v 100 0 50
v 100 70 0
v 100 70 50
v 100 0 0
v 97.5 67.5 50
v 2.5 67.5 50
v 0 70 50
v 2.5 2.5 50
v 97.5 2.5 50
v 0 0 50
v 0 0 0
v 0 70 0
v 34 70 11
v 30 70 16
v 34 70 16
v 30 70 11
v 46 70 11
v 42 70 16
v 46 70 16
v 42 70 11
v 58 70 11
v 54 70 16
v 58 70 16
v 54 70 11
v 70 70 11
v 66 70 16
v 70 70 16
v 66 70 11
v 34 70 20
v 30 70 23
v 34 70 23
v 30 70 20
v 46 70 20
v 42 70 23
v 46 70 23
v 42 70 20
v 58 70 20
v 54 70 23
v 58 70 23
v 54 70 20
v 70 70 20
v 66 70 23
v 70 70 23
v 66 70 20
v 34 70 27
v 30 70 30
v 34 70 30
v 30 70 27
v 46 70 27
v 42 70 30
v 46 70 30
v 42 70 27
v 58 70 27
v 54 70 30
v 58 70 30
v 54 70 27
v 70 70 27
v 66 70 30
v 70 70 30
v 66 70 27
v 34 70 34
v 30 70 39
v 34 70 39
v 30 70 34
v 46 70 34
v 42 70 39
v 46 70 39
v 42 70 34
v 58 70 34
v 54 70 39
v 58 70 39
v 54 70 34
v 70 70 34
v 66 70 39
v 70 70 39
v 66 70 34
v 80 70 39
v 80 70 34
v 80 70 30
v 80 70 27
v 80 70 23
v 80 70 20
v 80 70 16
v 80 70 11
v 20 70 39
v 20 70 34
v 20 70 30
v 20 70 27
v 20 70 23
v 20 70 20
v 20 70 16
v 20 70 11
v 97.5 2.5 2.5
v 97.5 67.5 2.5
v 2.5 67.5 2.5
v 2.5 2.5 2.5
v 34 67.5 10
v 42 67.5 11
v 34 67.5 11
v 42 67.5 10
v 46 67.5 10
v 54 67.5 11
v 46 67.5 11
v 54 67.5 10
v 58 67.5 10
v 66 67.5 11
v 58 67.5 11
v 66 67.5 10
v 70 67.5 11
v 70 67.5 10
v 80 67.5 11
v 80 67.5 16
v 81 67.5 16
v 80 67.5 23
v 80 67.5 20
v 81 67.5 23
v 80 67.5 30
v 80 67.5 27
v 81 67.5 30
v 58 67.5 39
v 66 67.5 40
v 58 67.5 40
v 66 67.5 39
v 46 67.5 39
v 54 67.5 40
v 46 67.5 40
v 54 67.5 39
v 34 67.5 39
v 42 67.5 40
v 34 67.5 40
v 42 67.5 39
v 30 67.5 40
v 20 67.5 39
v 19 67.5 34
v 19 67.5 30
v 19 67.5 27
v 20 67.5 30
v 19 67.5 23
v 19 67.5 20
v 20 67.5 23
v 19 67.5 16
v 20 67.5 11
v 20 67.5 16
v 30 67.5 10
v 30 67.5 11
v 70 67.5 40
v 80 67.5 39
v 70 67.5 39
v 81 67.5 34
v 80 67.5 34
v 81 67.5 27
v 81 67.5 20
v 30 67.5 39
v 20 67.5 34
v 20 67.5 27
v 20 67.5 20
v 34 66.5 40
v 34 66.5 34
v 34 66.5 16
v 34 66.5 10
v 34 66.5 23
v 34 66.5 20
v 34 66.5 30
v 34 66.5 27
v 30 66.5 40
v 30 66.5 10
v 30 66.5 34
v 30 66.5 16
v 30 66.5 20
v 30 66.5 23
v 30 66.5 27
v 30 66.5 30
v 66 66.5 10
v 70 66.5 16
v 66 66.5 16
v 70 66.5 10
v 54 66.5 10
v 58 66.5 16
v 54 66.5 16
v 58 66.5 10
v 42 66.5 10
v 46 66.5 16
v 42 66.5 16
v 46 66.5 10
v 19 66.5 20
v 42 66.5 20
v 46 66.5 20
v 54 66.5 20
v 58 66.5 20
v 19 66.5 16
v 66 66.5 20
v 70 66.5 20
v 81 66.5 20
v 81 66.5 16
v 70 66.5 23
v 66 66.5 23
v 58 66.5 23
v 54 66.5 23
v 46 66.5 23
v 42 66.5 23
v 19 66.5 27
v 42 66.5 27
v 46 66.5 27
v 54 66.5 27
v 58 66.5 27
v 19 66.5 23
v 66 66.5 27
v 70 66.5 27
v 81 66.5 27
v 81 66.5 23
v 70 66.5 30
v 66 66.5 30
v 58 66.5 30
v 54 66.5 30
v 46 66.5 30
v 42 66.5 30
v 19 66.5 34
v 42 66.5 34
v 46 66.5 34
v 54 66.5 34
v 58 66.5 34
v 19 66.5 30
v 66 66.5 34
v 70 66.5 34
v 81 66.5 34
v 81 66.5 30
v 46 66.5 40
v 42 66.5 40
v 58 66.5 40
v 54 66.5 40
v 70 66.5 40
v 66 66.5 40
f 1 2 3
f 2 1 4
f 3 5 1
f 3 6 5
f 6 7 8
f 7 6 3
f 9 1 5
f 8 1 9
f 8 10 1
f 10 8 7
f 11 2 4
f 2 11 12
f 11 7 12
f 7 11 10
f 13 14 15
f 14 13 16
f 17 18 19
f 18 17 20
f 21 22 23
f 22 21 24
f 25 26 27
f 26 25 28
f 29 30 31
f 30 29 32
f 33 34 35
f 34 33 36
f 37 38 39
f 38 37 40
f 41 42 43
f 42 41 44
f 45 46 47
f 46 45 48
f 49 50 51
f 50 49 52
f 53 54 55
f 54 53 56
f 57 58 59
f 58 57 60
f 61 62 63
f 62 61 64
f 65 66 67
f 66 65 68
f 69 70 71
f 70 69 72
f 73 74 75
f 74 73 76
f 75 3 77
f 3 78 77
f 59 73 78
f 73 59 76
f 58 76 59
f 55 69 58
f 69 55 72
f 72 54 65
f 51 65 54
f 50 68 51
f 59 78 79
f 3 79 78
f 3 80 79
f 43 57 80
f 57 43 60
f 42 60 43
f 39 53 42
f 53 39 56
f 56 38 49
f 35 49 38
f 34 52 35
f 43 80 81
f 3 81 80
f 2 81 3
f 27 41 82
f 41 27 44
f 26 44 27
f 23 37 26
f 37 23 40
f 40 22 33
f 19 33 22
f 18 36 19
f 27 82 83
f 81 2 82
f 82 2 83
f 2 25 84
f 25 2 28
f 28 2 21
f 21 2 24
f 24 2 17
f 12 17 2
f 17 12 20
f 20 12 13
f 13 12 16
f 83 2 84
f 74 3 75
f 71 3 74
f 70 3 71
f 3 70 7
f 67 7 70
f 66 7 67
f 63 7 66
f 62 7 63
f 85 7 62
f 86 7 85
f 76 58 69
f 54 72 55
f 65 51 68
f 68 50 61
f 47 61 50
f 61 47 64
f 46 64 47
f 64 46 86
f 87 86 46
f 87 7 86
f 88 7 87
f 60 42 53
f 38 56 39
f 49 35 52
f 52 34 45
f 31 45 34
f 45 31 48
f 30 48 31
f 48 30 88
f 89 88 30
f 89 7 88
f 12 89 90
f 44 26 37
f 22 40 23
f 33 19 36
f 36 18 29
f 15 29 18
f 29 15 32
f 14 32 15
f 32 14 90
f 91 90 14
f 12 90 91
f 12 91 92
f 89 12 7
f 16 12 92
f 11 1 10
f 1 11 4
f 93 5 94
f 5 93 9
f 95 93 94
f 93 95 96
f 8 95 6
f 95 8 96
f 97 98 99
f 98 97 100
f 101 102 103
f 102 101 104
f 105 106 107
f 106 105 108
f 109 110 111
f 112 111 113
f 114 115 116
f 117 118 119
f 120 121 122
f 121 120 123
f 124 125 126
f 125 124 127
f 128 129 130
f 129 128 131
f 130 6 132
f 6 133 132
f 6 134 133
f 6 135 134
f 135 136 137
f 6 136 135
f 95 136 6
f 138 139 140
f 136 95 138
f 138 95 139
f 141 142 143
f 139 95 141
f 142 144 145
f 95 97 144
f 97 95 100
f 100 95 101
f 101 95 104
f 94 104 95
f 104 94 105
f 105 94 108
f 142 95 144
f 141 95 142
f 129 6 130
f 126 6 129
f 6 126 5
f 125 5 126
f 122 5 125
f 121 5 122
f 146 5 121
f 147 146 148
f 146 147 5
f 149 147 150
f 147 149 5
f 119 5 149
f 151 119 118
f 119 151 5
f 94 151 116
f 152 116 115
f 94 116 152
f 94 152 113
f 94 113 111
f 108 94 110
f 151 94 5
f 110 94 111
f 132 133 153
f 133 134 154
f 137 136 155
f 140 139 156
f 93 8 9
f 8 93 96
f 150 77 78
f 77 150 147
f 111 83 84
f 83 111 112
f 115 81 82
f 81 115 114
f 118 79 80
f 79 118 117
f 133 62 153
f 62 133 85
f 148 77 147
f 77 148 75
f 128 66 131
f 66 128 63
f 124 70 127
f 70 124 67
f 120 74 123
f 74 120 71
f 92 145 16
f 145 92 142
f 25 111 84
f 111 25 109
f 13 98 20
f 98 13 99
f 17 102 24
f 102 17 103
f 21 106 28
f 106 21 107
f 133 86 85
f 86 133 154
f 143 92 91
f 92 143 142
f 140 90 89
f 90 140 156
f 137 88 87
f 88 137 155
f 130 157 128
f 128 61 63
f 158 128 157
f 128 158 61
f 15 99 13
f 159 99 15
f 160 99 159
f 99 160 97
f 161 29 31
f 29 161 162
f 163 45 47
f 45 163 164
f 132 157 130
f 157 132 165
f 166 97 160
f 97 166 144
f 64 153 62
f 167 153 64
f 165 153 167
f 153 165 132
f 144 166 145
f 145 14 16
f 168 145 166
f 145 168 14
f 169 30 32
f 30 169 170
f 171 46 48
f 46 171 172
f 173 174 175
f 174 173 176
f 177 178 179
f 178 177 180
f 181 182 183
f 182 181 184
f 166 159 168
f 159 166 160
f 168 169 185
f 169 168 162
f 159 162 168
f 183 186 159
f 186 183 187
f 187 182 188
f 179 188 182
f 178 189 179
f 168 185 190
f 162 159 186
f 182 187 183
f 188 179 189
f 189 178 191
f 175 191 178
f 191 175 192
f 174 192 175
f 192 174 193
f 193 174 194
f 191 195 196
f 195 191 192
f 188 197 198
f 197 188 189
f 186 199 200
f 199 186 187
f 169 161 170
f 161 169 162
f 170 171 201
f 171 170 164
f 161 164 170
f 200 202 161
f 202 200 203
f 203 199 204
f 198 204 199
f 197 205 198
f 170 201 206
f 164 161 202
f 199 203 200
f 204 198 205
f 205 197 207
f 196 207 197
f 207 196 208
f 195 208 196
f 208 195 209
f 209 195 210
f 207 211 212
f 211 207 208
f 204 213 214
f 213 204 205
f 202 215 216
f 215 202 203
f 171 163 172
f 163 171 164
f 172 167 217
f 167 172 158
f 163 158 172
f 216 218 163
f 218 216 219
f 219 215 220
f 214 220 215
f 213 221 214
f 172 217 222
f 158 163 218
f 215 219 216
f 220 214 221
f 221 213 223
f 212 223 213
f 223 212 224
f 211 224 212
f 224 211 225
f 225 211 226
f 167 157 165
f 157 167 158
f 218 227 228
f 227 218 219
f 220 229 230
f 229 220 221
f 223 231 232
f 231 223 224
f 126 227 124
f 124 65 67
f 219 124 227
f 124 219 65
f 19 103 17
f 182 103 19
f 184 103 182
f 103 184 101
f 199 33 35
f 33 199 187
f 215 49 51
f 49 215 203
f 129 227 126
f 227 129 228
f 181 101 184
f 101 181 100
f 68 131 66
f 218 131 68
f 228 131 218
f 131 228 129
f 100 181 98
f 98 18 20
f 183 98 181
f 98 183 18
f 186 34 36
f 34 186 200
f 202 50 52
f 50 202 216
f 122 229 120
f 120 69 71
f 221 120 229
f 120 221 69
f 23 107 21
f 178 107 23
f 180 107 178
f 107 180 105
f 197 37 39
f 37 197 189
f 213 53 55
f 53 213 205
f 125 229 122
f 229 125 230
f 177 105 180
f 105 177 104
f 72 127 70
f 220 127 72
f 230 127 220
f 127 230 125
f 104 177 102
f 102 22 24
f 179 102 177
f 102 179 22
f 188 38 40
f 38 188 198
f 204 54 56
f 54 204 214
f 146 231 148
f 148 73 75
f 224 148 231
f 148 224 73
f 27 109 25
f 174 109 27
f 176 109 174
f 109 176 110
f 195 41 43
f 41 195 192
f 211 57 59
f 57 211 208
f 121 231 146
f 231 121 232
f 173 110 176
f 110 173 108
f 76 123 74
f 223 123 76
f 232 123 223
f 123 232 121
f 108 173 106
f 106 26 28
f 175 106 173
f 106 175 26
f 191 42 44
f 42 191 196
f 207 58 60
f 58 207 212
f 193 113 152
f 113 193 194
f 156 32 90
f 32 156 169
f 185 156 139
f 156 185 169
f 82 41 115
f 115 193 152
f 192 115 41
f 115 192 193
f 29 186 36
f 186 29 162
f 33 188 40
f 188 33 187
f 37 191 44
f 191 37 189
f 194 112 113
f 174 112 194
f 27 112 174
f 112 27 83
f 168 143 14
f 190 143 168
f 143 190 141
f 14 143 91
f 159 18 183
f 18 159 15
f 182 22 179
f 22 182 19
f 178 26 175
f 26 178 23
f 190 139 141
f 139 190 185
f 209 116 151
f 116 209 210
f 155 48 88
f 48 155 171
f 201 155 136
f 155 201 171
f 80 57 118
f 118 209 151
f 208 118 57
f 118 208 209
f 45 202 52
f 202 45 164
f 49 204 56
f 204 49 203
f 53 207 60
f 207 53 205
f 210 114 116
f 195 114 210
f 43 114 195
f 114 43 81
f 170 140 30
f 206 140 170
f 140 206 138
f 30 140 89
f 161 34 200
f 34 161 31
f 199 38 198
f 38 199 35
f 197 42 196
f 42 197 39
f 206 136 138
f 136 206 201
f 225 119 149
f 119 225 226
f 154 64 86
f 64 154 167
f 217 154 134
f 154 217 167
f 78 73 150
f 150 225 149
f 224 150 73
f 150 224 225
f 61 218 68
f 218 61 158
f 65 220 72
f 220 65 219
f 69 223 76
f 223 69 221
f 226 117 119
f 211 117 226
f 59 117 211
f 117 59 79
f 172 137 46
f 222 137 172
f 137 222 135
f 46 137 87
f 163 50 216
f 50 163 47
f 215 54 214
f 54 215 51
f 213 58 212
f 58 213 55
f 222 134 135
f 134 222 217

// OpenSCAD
$fn = 32;

// ----------------------------------------------------------------------
// Vent box: crossgrid enclosure
// ----------------------------------------------------------------------

// --- parameters (mm) ---
box_l = 100;              // box length, X
box_w = 70;               // box width, Y
box_h = 50;               // box height, Z
wall_t = 2.5;             // shell wall thickness
win_l = 60;               // vent window width, X
win_h = 28;               // vent window height, Z
bar_w = 4;                // grid bar width
n_v = 4;                  // vertical bar count
n_h = 3;                  // horizontal bar count

win_z0 = (box_h - win_h) / 2;  // window lower edge Z
v_step = win_l / (n_v + 1);  // vertical bar step
h_step = win_h / (n_h + 1);  // horizontal bar step

difference() {
  union() {
    difference() {
      cube([box_l, box_w, box_h]);
  translate([wall_t, wall_t, wall_t])
    cube([box_l - 2 * wall_t, box_w - 2 * wall_t, box_h]);
  translate([(box_l - win_l) / 2, box_w - wall_t - 1, win_z0])
    cube([win_l, wall_t + 2, win_h]);
    }
    for (i = [1 : n_v])
      translate([(box_l - win_l) / 2 + i * v_step - bar_w / 2,
                 box_w - wall_t - 1, win_z0 - 1])
        cube([bar_w, wall_t + 1, win_h + 2]);
    for (i = [1 : n_h])
      translate([(box_l - win_l) / 2 - 1, box_w - wall_t - 1,
                 win_z0 + i * h_step - bar_w / 2])
        cube([win_l + 2, wall_t + 1, bar_w]);
  }
}
